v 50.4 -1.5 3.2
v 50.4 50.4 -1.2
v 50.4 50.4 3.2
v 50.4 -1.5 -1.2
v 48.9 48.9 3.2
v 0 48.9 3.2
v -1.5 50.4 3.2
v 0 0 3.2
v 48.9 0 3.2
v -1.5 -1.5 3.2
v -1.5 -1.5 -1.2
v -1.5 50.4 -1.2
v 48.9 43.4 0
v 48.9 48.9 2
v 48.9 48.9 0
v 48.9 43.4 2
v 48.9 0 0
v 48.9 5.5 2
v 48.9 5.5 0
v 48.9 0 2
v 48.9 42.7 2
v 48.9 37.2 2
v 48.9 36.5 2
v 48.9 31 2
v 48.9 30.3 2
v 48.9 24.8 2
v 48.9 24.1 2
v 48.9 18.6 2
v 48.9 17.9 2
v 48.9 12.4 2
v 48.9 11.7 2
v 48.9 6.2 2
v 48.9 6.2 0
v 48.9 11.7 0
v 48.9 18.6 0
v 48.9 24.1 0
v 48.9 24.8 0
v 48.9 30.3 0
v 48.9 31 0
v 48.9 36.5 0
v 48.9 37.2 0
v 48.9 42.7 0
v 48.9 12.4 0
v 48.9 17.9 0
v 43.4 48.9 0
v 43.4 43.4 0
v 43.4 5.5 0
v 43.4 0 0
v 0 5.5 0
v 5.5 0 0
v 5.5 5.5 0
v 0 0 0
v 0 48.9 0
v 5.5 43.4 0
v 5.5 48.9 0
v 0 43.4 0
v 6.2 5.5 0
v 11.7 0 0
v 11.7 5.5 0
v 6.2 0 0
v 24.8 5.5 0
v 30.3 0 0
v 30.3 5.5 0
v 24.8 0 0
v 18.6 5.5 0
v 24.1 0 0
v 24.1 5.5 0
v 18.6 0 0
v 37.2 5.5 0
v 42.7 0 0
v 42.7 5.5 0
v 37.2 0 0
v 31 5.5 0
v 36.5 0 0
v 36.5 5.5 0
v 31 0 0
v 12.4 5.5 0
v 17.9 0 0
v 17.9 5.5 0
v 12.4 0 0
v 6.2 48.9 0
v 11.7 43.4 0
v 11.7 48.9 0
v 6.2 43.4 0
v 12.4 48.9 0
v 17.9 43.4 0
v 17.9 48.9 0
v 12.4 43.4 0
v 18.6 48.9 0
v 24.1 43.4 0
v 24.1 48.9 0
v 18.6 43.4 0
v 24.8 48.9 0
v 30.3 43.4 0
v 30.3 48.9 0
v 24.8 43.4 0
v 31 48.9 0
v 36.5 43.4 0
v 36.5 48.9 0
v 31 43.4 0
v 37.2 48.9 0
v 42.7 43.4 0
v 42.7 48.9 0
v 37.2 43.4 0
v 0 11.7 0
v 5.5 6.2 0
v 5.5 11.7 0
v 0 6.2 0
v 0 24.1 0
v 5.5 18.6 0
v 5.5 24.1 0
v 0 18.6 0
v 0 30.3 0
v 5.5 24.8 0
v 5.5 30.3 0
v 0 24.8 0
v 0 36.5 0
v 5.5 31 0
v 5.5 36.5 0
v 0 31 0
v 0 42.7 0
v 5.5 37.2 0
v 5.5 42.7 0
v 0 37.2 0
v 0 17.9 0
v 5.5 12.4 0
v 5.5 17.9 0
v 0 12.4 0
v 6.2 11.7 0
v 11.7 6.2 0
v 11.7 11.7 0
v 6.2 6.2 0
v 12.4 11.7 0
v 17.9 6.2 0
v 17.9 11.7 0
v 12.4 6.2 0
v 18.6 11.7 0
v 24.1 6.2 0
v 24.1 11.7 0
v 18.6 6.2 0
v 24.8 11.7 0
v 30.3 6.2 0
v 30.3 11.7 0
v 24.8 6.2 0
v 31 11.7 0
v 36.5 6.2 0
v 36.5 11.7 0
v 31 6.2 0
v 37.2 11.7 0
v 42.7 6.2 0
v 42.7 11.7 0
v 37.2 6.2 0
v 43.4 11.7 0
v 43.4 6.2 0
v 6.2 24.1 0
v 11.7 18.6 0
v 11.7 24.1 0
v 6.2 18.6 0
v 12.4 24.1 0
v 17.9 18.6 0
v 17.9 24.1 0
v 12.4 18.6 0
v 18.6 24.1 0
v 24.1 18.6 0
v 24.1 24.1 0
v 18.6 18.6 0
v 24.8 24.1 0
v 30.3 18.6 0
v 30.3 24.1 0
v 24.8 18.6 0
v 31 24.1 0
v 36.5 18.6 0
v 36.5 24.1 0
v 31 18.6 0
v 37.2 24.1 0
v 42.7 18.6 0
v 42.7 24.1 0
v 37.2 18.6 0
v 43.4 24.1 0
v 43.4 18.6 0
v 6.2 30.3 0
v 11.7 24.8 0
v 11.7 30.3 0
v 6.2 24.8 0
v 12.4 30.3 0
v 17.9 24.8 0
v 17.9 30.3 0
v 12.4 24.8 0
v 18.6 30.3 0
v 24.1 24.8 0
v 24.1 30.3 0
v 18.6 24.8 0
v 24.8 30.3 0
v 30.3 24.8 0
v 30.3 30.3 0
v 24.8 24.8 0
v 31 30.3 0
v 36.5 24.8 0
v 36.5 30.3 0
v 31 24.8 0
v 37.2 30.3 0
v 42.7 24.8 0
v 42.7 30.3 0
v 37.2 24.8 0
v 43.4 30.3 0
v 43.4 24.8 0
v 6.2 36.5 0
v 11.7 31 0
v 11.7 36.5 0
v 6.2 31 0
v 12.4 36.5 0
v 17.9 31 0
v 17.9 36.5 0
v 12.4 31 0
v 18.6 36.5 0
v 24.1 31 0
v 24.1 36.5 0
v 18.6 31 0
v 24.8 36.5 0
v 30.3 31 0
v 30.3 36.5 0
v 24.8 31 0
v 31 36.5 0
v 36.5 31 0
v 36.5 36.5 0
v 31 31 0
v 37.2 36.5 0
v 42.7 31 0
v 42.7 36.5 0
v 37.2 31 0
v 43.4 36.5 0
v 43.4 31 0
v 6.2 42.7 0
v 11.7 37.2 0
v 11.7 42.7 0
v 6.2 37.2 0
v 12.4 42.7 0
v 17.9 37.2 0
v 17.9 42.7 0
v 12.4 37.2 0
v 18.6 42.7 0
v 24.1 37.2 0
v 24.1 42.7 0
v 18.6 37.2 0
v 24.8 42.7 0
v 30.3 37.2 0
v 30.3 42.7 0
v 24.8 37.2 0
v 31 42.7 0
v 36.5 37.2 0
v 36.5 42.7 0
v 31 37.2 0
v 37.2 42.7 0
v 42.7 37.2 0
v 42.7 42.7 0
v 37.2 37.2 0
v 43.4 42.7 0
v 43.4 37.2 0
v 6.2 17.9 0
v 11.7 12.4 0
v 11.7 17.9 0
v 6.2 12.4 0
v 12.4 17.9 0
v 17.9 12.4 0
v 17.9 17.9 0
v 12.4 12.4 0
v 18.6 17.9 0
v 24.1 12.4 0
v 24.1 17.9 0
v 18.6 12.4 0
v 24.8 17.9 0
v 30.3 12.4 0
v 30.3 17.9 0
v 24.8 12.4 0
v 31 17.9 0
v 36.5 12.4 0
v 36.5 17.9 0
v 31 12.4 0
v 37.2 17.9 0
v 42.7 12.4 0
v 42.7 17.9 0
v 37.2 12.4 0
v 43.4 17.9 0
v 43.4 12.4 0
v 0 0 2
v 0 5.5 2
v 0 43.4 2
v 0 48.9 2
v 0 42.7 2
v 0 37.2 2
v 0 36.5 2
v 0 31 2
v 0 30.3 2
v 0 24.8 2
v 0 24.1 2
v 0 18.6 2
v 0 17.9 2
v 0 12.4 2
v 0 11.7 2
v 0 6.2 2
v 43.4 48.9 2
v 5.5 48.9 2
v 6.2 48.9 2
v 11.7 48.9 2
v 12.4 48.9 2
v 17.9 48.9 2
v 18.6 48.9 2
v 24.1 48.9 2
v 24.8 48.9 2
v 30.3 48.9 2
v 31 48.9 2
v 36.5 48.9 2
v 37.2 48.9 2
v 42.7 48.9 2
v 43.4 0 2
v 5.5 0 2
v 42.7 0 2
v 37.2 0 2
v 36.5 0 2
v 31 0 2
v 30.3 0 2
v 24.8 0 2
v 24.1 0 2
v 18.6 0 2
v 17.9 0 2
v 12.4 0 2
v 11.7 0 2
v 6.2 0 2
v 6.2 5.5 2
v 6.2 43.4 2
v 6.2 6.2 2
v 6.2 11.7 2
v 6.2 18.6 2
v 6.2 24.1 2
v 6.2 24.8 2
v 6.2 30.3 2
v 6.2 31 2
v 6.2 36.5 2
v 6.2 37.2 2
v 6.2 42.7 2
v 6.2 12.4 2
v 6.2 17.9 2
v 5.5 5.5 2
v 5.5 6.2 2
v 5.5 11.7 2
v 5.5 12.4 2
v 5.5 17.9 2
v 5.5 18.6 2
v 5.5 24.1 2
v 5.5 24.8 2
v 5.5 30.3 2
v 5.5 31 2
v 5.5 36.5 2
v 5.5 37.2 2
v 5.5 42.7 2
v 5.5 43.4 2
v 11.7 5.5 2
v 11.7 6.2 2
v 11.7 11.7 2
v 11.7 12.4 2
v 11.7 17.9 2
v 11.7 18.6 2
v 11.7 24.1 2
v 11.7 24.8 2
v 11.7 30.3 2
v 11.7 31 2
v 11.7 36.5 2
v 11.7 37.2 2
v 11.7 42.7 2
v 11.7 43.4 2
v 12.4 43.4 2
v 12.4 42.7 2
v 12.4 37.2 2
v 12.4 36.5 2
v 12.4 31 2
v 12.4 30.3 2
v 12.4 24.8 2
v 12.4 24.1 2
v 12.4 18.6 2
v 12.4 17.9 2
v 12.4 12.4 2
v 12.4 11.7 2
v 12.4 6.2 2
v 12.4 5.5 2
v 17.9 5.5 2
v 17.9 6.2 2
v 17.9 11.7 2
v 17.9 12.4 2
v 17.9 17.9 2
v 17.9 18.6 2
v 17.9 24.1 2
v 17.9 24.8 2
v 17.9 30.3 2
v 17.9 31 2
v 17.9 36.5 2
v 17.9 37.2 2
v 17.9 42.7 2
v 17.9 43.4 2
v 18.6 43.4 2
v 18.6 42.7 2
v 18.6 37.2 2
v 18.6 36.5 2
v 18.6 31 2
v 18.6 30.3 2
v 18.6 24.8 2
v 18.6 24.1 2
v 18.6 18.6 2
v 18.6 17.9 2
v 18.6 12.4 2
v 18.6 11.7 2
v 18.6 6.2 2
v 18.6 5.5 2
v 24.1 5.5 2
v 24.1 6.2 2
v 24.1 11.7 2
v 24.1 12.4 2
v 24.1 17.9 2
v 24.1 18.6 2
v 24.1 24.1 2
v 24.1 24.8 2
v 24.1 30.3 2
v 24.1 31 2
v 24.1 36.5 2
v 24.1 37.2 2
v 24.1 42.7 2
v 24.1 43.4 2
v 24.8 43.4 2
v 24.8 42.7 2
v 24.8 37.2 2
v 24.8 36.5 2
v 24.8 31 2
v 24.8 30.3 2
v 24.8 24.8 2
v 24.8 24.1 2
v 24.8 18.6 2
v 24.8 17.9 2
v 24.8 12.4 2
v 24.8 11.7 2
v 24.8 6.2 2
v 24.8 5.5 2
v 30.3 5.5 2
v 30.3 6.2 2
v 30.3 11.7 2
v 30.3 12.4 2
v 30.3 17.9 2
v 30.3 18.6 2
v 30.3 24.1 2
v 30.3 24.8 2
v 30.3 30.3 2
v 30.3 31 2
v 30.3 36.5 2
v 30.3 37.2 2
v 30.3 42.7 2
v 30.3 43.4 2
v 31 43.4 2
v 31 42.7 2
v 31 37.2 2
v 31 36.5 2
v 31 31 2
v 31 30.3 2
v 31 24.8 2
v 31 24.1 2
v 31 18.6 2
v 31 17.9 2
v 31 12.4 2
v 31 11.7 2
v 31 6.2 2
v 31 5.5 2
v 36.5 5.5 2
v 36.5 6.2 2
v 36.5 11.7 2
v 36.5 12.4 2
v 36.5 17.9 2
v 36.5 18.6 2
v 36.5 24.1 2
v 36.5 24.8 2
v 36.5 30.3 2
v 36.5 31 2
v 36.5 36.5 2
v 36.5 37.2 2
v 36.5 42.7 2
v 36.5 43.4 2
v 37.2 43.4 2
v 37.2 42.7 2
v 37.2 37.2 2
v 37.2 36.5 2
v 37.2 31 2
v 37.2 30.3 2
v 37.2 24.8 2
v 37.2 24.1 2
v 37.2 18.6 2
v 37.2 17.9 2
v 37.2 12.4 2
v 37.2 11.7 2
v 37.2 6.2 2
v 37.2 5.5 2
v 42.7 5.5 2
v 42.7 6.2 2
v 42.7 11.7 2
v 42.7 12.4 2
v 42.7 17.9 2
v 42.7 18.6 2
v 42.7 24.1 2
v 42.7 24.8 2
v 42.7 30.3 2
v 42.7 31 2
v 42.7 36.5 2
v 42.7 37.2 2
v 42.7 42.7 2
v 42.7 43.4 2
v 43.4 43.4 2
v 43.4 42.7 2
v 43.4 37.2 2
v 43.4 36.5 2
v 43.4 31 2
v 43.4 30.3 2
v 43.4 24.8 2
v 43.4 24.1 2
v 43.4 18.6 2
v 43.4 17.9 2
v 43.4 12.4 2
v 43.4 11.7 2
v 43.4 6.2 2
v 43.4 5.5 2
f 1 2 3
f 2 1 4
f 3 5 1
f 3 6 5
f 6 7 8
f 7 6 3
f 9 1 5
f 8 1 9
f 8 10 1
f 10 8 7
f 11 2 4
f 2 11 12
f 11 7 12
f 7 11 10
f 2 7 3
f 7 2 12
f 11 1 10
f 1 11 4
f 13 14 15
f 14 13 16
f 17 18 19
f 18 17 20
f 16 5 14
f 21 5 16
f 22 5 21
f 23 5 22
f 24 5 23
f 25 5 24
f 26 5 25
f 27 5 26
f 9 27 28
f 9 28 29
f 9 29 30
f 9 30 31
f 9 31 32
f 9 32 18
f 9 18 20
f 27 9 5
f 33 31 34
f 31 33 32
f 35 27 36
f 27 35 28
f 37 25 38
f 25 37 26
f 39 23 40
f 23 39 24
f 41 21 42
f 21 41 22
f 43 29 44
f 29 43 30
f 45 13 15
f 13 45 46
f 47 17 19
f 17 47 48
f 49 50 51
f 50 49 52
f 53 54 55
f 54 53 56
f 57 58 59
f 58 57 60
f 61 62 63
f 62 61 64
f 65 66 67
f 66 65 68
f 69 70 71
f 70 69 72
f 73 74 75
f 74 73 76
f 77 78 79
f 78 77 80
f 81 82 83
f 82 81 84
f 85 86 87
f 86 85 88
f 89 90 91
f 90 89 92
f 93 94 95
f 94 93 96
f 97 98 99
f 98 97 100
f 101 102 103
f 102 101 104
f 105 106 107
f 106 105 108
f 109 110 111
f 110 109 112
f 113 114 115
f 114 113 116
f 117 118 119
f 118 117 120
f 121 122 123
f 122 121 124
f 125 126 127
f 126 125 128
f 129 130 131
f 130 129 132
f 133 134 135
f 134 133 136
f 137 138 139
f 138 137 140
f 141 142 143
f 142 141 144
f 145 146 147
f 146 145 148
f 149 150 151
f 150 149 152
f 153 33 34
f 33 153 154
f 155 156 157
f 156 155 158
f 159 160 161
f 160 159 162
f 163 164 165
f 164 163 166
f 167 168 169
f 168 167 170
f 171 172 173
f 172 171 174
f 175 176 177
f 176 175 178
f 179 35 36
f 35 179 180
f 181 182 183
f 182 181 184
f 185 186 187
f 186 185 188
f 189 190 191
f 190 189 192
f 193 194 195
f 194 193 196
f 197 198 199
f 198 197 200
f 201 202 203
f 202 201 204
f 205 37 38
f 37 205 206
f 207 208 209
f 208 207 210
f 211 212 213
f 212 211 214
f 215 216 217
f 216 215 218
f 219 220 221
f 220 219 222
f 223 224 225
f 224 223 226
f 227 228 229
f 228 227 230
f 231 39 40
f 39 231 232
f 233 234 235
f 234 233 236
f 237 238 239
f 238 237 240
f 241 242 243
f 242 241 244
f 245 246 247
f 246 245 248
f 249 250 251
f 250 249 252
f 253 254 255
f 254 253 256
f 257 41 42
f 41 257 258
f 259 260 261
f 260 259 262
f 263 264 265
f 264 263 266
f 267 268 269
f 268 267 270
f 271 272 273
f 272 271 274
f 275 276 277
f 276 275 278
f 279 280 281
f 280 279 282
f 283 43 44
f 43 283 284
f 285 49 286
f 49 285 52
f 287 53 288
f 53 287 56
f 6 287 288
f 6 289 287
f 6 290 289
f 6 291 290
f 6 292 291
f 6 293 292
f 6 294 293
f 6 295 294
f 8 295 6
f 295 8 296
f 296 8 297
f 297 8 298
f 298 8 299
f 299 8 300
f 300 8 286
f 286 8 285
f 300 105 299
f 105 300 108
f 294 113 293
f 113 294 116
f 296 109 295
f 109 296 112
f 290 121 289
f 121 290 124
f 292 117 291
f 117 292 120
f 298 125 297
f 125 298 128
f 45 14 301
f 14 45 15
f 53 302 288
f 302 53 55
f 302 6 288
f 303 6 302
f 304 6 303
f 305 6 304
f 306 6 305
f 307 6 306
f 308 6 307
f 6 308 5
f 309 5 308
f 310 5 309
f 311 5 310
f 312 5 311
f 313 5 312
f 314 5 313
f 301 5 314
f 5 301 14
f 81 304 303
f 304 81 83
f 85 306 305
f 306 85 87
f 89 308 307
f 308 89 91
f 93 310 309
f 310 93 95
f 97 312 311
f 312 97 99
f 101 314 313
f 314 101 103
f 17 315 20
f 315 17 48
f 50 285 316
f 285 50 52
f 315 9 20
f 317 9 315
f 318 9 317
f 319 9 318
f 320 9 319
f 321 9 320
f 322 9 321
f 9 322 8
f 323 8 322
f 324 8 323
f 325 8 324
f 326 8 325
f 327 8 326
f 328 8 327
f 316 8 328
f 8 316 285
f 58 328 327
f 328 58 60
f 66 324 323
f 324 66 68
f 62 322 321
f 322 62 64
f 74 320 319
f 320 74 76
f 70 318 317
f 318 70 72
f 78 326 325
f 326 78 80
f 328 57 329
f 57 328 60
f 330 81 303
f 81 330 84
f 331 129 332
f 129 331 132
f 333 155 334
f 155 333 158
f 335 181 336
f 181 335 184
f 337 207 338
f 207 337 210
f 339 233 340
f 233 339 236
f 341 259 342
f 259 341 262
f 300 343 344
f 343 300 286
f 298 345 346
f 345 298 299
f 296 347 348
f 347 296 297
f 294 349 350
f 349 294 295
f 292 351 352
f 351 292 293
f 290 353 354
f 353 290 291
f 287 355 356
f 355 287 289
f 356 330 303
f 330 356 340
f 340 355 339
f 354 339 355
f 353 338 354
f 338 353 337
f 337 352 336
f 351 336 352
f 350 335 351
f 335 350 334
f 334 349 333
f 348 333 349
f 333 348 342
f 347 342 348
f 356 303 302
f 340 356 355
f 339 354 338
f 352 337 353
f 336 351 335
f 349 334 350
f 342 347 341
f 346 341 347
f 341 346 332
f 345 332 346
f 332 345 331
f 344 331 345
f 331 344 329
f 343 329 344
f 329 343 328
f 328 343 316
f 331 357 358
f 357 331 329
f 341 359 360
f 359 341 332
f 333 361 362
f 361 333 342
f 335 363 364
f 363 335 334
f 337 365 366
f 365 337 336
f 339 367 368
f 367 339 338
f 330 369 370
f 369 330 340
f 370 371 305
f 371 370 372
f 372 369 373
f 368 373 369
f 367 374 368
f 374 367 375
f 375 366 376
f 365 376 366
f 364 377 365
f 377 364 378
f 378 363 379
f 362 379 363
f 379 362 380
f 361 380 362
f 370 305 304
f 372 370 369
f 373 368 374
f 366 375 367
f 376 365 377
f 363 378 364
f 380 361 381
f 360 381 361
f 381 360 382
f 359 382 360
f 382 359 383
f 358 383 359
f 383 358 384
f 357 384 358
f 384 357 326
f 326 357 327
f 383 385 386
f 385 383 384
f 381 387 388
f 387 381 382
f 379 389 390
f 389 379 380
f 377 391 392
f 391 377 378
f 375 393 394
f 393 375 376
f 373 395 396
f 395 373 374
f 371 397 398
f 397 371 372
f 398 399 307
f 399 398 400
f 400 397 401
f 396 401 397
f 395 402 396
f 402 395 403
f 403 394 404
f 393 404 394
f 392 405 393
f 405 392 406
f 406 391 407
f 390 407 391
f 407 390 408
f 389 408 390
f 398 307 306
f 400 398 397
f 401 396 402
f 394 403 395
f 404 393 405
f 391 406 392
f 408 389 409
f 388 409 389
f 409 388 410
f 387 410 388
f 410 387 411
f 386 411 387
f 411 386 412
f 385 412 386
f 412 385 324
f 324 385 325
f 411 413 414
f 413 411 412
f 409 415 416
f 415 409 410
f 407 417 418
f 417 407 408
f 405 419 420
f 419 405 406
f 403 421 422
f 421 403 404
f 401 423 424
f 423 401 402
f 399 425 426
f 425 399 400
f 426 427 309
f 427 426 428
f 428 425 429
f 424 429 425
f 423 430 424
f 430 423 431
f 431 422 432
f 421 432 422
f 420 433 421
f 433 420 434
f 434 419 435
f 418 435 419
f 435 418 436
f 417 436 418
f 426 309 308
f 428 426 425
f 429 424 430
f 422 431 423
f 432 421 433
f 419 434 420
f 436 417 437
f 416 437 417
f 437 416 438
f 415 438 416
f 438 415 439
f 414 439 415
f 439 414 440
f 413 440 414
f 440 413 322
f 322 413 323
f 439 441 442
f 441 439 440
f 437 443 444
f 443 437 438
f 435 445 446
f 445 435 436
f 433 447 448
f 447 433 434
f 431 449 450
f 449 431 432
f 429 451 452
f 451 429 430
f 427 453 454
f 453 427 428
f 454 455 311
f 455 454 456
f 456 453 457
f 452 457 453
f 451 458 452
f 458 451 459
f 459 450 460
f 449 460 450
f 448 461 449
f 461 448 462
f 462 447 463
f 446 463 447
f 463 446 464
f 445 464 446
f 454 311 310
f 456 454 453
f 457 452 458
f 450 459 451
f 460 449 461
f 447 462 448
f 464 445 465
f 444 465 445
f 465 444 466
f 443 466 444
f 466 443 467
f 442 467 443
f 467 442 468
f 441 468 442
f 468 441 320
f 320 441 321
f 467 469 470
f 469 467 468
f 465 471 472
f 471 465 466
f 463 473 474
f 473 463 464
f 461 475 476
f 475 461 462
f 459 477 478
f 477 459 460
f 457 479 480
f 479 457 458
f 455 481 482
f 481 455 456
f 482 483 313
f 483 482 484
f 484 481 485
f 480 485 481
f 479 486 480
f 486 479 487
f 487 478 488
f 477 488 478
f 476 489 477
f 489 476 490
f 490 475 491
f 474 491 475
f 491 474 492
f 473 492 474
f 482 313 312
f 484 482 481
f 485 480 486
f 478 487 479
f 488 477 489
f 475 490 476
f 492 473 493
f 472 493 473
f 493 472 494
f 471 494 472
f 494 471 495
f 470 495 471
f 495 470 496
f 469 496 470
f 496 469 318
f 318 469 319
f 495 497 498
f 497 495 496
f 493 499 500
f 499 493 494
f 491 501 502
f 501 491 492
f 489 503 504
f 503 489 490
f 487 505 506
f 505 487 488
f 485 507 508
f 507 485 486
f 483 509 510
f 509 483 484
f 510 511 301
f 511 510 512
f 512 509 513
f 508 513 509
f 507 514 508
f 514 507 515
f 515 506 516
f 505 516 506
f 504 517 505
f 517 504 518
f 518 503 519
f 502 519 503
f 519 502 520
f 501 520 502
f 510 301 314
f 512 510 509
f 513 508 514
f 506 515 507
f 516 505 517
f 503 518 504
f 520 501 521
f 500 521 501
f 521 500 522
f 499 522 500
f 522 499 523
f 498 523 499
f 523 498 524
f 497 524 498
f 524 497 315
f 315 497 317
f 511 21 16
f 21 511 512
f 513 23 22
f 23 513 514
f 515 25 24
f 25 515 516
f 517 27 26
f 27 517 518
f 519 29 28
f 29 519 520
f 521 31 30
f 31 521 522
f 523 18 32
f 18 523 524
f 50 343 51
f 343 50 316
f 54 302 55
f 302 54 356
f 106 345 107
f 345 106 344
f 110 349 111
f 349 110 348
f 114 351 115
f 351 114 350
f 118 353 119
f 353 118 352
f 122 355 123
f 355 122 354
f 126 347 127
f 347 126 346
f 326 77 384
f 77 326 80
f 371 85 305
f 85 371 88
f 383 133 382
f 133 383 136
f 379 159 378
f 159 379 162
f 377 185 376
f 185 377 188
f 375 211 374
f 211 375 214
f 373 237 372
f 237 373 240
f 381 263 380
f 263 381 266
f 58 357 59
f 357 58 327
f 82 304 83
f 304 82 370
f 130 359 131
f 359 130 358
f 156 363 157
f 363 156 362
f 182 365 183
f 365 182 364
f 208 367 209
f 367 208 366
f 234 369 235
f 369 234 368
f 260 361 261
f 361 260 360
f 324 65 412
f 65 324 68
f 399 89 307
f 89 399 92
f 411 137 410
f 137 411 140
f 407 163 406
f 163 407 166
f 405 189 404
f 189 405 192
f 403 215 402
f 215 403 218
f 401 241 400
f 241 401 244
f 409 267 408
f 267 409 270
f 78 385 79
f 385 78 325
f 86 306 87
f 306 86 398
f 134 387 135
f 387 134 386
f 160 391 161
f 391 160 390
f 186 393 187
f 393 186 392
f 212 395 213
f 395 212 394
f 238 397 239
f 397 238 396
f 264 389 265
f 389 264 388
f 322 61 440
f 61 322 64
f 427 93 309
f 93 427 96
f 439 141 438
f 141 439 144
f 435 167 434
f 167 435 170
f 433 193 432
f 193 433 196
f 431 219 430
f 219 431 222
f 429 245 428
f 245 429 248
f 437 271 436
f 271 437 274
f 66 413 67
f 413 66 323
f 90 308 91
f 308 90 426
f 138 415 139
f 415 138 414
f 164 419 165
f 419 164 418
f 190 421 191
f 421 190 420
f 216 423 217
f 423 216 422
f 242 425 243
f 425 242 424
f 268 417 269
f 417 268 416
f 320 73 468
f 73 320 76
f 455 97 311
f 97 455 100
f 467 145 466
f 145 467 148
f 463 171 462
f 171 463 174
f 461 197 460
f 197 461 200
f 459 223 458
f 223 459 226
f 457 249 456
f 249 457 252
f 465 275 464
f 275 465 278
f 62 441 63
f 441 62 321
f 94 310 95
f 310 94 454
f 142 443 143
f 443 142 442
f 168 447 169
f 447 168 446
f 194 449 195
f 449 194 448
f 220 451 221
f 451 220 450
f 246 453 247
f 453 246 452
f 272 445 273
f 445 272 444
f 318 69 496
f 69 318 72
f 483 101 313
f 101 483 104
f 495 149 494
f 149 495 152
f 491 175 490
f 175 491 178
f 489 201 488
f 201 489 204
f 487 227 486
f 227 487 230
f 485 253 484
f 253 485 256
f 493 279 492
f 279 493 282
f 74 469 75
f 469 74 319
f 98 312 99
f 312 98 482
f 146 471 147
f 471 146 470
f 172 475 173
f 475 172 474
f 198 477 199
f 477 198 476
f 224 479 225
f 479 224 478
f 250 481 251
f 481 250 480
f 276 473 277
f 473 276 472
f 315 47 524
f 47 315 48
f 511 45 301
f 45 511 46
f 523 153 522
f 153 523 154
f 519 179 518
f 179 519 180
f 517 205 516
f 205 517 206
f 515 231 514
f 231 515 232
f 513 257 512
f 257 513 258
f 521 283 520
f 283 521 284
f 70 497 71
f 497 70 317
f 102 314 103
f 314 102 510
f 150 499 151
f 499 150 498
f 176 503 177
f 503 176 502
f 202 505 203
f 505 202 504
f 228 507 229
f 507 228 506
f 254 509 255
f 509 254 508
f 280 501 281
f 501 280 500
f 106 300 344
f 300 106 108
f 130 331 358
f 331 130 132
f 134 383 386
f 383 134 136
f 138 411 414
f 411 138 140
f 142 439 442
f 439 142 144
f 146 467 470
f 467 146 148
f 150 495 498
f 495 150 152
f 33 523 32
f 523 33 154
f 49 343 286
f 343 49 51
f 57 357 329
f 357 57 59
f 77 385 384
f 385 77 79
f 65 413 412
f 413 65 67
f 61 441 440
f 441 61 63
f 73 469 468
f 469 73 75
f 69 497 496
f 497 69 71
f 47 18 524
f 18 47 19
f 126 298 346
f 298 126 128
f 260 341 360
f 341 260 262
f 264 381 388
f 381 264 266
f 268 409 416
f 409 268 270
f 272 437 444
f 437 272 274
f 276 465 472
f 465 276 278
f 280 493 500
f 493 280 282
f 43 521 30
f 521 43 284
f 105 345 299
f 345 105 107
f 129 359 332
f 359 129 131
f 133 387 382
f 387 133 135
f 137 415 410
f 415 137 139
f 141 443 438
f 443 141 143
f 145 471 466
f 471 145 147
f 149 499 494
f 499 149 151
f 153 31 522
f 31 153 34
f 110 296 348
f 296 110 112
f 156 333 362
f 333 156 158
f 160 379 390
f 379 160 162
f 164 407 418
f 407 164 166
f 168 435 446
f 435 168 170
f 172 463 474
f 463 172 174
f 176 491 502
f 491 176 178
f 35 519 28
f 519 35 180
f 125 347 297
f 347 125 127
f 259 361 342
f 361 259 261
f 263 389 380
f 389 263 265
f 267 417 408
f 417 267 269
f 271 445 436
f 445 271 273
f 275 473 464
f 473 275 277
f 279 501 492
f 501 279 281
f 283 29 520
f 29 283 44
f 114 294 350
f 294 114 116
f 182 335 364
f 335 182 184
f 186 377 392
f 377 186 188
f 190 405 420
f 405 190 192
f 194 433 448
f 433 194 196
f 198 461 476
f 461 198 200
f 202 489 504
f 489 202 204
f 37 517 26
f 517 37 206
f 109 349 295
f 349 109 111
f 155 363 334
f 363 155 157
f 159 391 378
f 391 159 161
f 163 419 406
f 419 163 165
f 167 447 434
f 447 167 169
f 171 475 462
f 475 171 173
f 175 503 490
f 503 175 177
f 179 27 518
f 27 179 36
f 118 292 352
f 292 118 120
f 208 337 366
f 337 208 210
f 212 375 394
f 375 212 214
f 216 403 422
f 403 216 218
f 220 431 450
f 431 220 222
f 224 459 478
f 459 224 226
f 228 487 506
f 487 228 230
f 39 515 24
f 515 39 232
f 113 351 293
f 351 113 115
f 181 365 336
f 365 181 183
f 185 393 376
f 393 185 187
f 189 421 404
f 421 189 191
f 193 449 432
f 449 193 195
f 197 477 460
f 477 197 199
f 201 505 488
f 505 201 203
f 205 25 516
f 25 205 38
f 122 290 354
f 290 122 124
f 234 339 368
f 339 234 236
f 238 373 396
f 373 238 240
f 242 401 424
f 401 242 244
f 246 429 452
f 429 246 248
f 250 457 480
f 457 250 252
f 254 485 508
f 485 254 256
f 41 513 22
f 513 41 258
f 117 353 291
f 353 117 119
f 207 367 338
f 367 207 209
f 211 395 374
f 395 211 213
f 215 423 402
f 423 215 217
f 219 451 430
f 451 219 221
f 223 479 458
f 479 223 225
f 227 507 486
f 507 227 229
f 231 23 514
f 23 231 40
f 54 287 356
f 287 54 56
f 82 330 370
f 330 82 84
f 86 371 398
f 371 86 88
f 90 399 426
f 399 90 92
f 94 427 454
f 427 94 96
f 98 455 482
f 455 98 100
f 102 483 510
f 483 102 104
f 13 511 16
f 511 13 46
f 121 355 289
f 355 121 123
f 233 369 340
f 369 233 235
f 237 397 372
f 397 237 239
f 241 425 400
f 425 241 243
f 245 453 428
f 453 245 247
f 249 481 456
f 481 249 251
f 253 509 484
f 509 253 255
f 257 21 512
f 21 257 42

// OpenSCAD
//// Bottom part of TLD holder with rectangular grid
$fn = 100;

/// Parameters
A = 8;  // Number of rows
B = 8;  // Number of columns

a = 5.5;  // width of one compartment
b = 5.5;  // length of one compartment

h = 2;  // Inner depth of the compartment

twb = 1.2; // thickness of the bottom wall
tw = 0.7;  // thickness of inner walls
TW = 1.5;  // thickness of outer walls

W = A*a + (A-1)*tw + 2*TW;   // Total width of holder
L = B*b + (B-1)*tw + 2*TW;  // Total length of holder
H = h + twb + 1.2;  // Total heigth of bottom part of the holder

union() {
difference() {
    translate([-TW, -TW, -twb]) cube([W, L, H]);
    
    cube([W-2*TW, L-2*TW, H]);
}

 for (i = [0 : A]) {
                                translate([i * (a+tw)-tw, 0, 0])
                                        cube([tw, B*b + B*tw, h]);
                        }


 for (i = [0 : B]) {
                                translate([0, i * (b+tw)-tw, 0])
                                        cube([A*a+A*tw, tw, h]);
                        }



}
